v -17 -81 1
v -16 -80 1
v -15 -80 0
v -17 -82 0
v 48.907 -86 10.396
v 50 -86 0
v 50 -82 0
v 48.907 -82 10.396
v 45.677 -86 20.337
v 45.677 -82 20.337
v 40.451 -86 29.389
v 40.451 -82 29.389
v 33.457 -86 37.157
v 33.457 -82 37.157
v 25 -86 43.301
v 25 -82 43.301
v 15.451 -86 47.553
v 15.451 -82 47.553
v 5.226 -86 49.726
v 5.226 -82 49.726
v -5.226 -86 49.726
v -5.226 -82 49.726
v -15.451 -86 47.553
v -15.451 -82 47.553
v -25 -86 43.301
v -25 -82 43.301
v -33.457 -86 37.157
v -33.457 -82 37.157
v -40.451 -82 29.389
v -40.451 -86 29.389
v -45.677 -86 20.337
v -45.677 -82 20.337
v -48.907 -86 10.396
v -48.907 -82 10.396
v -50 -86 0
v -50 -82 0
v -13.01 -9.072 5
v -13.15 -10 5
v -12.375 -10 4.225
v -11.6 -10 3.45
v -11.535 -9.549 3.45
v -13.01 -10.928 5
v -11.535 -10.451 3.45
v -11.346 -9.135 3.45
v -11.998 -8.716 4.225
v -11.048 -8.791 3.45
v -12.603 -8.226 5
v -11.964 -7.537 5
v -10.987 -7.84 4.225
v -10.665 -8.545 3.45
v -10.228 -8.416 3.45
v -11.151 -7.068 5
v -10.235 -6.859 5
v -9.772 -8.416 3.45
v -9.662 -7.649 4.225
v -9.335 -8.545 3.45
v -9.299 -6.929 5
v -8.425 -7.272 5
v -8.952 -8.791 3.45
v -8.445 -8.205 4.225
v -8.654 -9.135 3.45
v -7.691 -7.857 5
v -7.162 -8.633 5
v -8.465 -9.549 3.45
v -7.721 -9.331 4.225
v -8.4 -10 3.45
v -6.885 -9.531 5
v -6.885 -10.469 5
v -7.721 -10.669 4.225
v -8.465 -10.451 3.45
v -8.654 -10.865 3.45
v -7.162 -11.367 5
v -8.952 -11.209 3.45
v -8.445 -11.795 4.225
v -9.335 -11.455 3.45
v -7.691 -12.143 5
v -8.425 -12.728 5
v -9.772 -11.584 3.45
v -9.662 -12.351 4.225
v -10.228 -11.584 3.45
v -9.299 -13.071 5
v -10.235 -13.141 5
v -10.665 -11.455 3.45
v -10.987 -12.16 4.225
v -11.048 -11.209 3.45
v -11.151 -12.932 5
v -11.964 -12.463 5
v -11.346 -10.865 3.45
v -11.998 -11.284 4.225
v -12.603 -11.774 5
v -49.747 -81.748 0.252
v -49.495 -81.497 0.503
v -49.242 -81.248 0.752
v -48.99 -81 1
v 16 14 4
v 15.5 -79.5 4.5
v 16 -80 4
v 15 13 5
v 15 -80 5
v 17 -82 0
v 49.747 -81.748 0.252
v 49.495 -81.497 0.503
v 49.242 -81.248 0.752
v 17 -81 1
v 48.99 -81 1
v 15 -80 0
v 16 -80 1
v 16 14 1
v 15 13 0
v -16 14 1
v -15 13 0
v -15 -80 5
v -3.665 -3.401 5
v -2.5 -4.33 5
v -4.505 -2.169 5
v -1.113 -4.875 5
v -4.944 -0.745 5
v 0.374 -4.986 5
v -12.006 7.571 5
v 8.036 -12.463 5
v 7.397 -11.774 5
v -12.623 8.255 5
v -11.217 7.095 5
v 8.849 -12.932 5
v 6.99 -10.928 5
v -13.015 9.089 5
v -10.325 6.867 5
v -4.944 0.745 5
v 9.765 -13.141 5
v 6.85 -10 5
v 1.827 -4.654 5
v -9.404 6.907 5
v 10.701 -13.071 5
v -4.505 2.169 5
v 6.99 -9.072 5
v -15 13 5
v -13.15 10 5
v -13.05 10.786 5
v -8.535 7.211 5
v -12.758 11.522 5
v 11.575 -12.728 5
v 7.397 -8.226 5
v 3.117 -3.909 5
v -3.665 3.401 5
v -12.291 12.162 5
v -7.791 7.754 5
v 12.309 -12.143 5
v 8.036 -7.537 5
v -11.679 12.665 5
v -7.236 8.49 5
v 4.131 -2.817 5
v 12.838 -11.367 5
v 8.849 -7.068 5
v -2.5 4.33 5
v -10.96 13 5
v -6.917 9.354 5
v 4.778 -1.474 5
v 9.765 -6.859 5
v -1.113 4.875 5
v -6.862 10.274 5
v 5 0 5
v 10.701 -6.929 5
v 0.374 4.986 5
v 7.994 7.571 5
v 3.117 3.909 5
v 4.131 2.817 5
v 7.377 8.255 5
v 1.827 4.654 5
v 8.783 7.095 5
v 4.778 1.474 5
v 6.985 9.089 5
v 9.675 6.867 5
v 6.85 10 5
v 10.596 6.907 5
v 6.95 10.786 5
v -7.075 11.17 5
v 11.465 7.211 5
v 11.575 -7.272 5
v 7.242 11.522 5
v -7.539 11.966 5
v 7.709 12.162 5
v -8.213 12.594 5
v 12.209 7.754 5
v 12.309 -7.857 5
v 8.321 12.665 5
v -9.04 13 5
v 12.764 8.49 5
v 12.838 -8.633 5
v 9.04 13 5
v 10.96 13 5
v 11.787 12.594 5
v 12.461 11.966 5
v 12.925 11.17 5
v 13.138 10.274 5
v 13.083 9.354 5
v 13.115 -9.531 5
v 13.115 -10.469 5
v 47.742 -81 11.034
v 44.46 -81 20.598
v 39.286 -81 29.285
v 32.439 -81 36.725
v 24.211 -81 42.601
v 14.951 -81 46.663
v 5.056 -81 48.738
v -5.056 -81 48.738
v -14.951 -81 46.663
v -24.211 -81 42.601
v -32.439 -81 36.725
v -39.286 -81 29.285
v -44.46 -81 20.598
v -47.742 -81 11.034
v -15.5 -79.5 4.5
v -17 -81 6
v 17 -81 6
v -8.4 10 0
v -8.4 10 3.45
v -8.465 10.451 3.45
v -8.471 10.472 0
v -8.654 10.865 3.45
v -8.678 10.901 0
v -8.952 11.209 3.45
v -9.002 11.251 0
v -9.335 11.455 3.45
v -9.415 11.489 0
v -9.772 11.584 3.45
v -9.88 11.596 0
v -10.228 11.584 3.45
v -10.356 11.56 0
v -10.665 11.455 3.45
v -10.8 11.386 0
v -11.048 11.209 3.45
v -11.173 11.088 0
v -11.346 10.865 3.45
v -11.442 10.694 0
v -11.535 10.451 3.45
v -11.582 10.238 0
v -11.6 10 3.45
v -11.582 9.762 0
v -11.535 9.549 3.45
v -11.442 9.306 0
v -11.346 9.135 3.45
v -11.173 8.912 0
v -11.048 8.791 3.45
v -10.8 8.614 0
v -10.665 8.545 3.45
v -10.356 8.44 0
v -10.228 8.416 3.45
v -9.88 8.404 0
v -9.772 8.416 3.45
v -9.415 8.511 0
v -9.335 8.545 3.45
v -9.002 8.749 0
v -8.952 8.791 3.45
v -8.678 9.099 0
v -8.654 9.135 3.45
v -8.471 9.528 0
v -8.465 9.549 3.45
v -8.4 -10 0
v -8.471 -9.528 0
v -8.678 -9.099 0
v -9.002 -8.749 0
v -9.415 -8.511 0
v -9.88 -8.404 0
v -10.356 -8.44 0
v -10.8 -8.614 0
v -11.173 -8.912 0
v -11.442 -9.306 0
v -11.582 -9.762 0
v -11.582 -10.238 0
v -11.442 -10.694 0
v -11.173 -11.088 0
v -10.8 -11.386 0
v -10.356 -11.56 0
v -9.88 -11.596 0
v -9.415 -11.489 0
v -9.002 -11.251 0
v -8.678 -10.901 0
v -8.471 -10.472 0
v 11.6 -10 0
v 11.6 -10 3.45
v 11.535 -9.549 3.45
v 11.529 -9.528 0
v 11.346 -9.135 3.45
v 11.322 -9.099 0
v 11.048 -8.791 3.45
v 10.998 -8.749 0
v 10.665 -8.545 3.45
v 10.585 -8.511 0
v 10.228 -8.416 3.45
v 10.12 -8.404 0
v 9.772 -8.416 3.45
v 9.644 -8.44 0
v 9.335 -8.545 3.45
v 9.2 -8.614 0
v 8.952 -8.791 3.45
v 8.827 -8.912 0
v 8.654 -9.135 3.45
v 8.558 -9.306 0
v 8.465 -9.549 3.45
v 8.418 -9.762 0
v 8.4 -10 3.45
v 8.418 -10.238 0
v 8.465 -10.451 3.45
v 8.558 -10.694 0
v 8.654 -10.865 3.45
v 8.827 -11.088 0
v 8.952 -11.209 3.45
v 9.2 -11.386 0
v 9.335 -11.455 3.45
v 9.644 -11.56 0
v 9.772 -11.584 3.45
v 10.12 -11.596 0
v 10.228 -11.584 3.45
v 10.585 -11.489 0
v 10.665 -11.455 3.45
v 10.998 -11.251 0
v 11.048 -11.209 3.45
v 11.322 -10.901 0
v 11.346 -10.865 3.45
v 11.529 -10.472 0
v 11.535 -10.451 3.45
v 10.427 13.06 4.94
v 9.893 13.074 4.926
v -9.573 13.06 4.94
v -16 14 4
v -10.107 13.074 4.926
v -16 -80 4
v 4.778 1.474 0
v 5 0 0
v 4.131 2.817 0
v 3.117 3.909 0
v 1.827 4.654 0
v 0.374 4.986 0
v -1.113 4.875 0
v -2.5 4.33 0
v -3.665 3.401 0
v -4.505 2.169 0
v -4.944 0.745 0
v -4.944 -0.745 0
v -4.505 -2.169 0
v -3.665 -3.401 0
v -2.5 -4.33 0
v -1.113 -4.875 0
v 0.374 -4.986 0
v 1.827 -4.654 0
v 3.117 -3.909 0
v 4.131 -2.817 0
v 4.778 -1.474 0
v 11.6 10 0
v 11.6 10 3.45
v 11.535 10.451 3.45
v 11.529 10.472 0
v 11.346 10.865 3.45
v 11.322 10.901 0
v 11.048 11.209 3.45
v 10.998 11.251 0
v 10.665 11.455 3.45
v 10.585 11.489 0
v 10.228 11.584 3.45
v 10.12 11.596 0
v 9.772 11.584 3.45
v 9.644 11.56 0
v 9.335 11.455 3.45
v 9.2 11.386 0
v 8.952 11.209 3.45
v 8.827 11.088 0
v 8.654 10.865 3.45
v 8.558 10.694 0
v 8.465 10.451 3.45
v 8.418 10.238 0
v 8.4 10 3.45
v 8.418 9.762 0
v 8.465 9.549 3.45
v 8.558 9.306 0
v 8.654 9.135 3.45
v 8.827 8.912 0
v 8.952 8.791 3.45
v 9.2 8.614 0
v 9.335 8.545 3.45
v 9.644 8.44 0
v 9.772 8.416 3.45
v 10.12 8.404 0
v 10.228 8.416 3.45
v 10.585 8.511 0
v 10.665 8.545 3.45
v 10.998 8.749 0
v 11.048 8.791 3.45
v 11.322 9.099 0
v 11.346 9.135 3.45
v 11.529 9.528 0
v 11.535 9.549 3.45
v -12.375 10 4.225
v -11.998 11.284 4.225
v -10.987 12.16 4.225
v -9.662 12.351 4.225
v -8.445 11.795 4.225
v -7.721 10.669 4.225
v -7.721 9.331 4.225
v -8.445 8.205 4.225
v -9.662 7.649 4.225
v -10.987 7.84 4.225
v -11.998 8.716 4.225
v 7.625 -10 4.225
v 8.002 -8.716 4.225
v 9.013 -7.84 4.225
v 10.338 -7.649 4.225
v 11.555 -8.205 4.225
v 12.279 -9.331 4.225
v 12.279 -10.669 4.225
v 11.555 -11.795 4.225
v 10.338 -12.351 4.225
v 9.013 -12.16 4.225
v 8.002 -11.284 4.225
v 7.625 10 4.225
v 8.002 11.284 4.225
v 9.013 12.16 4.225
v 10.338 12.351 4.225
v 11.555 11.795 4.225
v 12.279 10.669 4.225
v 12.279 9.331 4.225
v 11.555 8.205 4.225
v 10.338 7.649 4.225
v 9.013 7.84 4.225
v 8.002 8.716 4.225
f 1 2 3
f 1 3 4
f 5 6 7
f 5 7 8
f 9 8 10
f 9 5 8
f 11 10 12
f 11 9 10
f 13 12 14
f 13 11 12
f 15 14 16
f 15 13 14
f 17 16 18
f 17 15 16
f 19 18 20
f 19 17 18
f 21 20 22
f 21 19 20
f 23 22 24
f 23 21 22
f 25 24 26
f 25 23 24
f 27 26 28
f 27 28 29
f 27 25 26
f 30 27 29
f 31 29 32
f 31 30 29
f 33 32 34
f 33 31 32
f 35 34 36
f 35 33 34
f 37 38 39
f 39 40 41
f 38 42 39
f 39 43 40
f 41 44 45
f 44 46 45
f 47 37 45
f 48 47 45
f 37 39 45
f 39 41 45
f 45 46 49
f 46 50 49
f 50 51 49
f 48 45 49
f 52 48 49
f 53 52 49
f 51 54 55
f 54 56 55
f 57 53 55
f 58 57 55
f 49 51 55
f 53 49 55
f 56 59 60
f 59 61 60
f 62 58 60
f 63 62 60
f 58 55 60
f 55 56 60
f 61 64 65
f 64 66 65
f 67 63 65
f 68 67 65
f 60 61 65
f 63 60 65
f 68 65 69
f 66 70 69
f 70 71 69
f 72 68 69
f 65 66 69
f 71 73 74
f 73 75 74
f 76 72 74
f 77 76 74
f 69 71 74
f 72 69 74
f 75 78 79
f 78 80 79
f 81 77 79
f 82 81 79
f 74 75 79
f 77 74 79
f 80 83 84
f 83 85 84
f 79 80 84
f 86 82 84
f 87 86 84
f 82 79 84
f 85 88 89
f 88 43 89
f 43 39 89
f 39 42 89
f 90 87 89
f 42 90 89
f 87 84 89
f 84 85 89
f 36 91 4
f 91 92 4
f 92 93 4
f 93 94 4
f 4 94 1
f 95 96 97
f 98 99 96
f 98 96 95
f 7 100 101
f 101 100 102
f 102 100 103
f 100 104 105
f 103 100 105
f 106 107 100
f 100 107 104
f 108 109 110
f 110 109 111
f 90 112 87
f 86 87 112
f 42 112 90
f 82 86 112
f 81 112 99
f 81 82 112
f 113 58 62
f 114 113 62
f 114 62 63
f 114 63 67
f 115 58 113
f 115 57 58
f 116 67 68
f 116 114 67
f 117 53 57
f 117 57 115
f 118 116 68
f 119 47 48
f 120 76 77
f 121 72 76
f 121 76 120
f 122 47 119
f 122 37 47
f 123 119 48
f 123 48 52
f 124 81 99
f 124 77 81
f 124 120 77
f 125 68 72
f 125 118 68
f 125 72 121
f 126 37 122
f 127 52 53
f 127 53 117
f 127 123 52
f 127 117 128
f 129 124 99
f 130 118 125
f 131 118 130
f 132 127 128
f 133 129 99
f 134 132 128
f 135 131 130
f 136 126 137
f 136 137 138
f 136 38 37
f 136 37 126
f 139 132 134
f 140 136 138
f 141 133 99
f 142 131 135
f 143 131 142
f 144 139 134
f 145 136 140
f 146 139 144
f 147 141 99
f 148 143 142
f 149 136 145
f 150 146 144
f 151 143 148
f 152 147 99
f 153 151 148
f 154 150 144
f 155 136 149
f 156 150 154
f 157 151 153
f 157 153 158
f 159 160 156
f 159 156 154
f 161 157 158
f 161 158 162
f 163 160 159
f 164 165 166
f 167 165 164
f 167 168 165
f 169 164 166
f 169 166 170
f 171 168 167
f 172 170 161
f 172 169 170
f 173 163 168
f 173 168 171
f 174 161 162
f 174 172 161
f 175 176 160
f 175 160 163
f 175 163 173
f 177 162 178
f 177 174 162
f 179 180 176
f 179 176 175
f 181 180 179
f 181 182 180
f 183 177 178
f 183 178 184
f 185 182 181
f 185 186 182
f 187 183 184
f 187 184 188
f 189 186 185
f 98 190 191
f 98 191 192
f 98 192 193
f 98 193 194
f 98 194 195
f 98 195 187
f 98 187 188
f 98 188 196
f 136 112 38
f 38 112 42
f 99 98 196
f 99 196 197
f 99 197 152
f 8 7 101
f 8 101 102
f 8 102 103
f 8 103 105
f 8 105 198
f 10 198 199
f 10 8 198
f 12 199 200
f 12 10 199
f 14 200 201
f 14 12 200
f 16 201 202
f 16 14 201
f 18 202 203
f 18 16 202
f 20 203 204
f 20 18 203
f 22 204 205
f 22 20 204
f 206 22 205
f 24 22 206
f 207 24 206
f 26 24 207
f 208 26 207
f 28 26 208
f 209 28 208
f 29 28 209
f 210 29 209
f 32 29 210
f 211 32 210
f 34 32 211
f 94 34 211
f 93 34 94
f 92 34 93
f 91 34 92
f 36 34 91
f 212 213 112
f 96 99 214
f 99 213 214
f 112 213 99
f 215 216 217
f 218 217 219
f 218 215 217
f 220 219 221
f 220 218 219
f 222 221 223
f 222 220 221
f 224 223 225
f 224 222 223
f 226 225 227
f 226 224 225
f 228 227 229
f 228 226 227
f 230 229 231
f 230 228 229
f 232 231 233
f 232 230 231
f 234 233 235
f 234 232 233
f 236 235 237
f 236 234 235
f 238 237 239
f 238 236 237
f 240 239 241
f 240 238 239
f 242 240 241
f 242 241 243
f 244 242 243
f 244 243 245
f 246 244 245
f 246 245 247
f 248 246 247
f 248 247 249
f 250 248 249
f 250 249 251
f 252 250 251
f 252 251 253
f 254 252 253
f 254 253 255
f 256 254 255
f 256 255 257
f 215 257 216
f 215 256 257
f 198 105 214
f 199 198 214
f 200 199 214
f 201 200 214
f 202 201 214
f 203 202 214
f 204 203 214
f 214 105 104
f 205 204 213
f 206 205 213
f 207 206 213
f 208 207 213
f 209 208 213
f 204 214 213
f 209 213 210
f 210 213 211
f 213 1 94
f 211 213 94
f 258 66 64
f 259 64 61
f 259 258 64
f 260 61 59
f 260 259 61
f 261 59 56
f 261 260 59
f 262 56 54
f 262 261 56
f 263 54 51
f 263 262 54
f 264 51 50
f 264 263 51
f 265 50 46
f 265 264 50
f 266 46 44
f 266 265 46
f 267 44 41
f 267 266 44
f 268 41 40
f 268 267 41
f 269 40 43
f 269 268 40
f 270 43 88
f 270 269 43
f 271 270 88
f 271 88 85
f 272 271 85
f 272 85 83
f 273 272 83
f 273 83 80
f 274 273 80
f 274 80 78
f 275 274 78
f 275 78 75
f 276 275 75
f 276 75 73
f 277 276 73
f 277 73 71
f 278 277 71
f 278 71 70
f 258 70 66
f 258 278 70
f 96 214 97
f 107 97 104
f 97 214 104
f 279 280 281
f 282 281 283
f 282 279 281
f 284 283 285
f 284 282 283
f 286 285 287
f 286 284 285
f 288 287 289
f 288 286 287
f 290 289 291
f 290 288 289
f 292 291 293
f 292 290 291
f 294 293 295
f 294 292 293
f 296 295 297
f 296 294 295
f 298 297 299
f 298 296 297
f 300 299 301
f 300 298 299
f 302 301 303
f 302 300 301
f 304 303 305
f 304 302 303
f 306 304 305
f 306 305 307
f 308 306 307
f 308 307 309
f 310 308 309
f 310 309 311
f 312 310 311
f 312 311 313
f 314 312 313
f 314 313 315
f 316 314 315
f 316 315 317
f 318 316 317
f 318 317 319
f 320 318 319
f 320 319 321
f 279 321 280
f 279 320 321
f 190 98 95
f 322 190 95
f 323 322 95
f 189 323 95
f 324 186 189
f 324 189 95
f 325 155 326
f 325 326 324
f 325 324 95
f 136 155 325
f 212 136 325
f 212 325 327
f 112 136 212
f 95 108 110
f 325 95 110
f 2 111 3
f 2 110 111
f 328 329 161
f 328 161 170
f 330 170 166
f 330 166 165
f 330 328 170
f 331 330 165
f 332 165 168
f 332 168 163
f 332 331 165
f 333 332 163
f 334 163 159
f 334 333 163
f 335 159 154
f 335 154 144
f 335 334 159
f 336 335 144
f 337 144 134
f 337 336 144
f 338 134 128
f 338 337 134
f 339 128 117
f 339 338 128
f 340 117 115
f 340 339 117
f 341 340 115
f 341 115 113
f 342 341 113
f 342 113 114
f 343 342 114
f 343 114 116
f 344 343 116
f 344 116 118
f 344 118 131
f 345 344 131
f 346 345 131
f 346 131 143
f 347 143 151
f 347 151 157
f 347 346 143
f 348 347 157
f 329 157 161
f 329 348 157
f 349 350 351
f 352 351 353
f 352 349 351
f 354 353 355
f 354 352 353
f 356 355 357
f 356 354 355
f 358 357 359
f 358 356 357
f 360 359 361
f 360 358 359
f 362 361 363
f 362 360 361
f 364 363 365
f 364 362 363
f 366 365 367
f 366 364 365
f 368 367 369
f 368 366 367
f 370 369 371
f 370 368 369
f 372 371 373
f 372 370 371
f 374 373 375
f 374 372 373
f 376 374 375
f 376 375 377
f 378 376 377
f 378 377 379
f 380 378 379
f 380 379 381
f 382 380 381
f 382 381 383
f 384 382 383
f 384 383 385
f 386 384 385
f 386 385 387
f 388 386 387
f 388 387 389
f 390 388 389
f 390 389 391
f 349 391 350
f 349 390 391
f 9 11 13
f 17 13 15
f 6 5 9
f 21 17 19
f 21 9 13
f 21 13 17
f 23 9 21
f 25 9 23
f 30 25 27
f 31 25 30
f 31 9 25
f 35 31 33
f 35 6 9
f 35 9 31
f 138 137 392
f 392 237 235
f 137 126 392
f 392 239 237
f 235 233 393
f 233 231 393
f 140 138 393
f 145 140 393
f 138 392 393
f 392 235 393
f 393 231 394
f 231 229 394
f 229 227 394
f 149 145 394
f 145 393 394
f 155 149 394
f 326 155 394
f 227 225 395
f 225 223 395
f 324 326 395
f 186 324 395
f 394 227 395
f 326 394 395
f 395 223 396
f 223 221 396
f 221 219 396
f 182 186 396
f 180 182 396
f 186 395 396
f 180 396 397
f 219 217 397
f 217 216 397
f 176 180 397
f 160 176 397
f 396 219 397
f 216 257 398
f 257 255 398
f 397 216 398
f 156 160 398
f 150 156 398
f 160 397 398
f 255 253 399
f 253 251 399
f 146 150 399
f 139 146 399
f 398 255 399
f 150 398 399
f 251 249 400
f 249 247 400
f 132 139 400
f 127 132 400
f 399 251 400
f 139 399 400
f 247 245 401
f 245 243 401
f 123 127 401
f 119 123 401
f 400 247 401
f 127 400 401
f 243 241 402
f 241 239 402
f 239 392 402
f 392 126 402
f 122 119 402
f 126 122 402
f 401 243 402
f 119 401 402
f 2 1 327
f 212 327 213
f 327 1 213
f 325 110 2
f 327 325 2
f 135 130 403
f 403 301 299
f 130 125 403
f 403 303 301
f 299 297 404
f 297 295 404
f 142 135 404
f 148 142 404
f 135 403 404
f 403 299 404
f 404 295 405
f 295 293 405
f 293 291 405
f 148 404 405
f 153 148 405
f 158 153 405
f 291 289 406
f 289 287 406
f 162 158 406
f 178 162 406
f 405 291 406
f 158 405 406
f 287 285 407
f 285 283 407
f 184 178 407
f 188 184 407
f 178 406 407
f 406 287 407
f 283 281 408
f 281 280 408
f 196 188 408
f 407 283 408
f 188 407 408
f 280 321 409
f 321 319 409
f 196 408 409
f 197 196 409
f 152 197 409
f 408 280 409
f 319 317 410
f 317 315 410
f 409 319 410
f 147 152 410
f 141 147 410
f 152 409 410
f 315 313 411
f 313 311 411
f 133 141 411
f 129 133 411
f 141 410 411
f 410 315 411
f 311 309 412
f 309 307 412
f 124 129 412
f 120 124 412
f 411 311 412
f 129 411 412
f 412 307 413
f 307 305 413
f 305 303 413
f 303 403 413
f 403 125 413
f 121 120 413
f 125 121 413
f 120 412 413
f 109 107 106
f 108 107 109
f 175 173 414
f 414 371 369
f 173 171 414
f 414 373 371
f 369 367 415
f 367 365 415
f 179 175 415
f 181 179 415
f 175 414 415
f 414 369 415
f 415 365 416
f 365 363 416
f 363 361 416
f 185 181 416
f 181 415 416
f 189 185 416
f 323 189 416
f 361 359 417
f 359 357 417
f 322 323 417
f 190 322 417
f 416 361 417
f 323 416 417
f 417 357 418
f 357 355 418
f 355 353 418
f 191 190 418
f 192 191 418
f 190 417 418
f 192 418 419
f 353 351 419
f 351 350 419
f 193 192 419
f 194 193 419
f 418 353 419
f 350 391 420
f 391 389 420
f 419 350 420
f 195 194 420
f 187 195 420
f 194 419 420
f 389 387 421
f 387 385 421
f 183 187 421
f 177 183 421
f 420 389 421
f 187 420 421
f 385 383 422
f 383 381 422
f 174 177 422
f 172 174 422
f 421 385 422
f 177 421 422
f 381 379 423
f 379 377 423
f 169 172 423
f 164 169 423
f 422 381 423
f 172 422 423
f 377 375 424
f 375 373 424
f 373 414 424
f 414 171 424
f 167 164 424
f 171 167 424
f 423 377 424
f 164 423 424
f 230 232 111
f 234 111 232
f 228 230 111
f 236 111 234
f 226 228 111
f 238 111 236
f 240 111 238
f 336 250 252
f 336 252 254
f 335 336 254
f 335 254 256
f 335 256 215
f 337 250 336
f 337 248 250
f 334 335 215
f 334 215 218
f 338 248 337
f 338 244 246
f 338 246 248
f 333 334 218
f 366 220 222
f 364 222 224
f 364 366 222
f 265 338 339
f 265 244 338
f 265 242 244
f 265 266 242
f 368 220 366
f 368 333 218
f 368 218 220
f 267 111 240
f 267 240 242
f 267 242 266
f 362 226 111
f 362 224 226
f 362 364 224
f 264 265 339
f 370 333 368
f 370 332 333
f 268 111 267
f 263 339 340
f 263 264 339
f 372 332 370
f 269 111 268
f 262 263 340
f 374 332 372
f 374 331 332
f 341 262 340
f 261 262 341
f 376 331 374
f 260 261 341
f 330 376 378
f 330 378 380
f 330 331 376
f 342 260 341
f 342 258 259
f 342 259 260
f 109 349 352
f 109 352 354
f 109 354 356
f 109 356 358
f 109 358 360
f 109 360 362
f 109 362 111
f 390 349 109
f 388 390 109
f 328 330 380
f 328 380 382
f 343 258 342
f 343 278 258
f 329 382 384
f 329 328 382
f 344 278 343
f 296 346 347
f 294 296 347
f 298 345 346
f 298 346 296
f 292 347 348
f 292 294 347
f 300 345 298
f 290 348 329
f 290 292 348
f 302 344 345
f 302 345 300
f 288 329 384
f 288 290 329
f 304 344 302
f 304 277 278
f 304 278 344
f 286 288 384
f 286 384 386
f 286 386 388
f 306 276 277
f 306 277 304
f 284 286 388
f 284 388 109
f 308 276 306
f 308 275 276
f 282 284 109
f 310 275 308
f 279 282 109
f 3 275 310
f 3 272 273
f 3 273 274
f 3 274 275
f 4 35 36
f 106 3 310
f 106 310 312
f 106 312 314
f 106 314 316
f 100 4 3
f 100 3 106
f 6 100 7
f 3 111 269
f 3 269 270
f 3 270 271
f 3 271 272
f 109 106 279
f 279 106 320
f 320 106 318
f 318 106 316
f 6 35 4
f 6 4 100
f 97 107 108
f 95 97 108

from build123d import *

# Parameters (mm, degrees)
SKIZZE1_R                                            = 5
SKIZZE1_R_2                                          = 1.6
AUFSATZ_LINEAR_AUSTRAGEN1_DEPTH                      = 5
AUFSATZ_LINEAR_AUSTRAGEN2_DEPTH                      = 5
FASE1_SIZE                                           = 1
FASE2_SIZE                                           = 1
FASE3_SIZE                                           = 1
FORMSENKUNG_F_R_M3_LINSENSENKSCHRAUBE_MI_D           = 3.2
FORMSENKUNG_F_R_M3_LINSENSENKSCHRAUBE_MI_CSINK_D     = 6.3
FORMSENKUNG_F_R_M3_LINSENSENKSCHRAUBE_MI_CSINK_ANGLE = 90


with BuildPart() as part:
    # Skizze1 → Aufsatz-Linear austragen1 (new body)
    with BuildSketch(Plane.XY):
        Polygon((16, -13.386681205), (16, 7.597112796), (16, 14), (-16, 14), (-16, 4.559518535), (-16, -16.424275466), (-16, -86), (16, -86), align=None)
        Circle(SKIZZE1_R, mode=Mode.SUBTRACT)
        with Locations((10, -10)):
            Circle(SKIZZE1_R_2, mode=Mode.SUBTRACT)
        with Locations((-10, -10)):
            Circle(SKIZZE1_R_2, mode=Mode.SUBTRACT)
        with Locations((-10, 10)):
            Circle(SKIZZE1_R_2, mode=Mode.SUBTRACT)
        with Locations((10, 10)):
            Circle(SKIZZE1_R_2, mode=Mode.SUBTRACT)
    extrude(amount=AUFSATZ_LINEAR_AUSTRAGEN1_DEPTH)

    # Skizze2 → Aufsatz-Linear austragen2 (add)
    with BuildSketch(Plane(origin=(0, -86, 0), x_dir=(-1, 0, 0), z_dir=(0, -1, 0))):
        with BuildLine():
            Line((50, 0), (16, 0))
            Line((16, 0), (16, -5))
            Line((16, -5), (-16, -5))
            Line((-16, -5), (-16, 0))
            Line((-16, 0), (-50, 0))
            ThreePointArc((-50, 0), (0, -50), (50, 0))
        make_face()
    extrude(amount=-AUFSATZ_LINEAR_AUSTRAGEN2_DEPTH)

    # Fase1
    fase1_edges = [part.edges().sort_by_distance(p)[0] for p in [
        (16, -33.5, 0),
        (33, -81, 0),
        (-33, -81, 0),
        (0, -81, 50),
        (16, -81, 2.5),
        (0, -81, 5),
        (-16, -81, 2.5),
        (-16, -33.5, 0),
    ]]
    chamfer(fase1_edges, length=FASE1_SIZE)

    # Fase2
    fase2_edges = [part.edges().sort_by_distance(p)[0] for p in [
        (0, 14, 5),
        (-16, -33, 5),
        (16, -33, 5),
    ]]
    chamfer(fase2_edges, length=FASE2_SIZE)

    # Fase3
    fase3_edges = [part.edges().sort_by_distance(p)[0] for p in [
        (0, 14, 0),
    ]]
    chamfer(fase3_edges, length=FASE3_SIZE)

    # Formsenkung für M3 Linsensenkschraube mit Schlitz1 (through all)
    with Locations(Plane.XY.offset(5)):
        with Locations((-10, 10), (10, 10), (-10, -10), (10, -10)):
            CounterSinkHole(FORMSENKUNG_F_R_M3_LINSENSENKSCHRAUBE_MI_D / 2, FORMSENKUNG_F_R_M3_LINSENSENKSCHRAUBE_MI_CSINK_D / 2, counter_sink_angle=FORMSENKUNG_F_R_M3_LINSENSENKSCHRAUBE_MI_CSINK_ANGLE)


solid = part.part
